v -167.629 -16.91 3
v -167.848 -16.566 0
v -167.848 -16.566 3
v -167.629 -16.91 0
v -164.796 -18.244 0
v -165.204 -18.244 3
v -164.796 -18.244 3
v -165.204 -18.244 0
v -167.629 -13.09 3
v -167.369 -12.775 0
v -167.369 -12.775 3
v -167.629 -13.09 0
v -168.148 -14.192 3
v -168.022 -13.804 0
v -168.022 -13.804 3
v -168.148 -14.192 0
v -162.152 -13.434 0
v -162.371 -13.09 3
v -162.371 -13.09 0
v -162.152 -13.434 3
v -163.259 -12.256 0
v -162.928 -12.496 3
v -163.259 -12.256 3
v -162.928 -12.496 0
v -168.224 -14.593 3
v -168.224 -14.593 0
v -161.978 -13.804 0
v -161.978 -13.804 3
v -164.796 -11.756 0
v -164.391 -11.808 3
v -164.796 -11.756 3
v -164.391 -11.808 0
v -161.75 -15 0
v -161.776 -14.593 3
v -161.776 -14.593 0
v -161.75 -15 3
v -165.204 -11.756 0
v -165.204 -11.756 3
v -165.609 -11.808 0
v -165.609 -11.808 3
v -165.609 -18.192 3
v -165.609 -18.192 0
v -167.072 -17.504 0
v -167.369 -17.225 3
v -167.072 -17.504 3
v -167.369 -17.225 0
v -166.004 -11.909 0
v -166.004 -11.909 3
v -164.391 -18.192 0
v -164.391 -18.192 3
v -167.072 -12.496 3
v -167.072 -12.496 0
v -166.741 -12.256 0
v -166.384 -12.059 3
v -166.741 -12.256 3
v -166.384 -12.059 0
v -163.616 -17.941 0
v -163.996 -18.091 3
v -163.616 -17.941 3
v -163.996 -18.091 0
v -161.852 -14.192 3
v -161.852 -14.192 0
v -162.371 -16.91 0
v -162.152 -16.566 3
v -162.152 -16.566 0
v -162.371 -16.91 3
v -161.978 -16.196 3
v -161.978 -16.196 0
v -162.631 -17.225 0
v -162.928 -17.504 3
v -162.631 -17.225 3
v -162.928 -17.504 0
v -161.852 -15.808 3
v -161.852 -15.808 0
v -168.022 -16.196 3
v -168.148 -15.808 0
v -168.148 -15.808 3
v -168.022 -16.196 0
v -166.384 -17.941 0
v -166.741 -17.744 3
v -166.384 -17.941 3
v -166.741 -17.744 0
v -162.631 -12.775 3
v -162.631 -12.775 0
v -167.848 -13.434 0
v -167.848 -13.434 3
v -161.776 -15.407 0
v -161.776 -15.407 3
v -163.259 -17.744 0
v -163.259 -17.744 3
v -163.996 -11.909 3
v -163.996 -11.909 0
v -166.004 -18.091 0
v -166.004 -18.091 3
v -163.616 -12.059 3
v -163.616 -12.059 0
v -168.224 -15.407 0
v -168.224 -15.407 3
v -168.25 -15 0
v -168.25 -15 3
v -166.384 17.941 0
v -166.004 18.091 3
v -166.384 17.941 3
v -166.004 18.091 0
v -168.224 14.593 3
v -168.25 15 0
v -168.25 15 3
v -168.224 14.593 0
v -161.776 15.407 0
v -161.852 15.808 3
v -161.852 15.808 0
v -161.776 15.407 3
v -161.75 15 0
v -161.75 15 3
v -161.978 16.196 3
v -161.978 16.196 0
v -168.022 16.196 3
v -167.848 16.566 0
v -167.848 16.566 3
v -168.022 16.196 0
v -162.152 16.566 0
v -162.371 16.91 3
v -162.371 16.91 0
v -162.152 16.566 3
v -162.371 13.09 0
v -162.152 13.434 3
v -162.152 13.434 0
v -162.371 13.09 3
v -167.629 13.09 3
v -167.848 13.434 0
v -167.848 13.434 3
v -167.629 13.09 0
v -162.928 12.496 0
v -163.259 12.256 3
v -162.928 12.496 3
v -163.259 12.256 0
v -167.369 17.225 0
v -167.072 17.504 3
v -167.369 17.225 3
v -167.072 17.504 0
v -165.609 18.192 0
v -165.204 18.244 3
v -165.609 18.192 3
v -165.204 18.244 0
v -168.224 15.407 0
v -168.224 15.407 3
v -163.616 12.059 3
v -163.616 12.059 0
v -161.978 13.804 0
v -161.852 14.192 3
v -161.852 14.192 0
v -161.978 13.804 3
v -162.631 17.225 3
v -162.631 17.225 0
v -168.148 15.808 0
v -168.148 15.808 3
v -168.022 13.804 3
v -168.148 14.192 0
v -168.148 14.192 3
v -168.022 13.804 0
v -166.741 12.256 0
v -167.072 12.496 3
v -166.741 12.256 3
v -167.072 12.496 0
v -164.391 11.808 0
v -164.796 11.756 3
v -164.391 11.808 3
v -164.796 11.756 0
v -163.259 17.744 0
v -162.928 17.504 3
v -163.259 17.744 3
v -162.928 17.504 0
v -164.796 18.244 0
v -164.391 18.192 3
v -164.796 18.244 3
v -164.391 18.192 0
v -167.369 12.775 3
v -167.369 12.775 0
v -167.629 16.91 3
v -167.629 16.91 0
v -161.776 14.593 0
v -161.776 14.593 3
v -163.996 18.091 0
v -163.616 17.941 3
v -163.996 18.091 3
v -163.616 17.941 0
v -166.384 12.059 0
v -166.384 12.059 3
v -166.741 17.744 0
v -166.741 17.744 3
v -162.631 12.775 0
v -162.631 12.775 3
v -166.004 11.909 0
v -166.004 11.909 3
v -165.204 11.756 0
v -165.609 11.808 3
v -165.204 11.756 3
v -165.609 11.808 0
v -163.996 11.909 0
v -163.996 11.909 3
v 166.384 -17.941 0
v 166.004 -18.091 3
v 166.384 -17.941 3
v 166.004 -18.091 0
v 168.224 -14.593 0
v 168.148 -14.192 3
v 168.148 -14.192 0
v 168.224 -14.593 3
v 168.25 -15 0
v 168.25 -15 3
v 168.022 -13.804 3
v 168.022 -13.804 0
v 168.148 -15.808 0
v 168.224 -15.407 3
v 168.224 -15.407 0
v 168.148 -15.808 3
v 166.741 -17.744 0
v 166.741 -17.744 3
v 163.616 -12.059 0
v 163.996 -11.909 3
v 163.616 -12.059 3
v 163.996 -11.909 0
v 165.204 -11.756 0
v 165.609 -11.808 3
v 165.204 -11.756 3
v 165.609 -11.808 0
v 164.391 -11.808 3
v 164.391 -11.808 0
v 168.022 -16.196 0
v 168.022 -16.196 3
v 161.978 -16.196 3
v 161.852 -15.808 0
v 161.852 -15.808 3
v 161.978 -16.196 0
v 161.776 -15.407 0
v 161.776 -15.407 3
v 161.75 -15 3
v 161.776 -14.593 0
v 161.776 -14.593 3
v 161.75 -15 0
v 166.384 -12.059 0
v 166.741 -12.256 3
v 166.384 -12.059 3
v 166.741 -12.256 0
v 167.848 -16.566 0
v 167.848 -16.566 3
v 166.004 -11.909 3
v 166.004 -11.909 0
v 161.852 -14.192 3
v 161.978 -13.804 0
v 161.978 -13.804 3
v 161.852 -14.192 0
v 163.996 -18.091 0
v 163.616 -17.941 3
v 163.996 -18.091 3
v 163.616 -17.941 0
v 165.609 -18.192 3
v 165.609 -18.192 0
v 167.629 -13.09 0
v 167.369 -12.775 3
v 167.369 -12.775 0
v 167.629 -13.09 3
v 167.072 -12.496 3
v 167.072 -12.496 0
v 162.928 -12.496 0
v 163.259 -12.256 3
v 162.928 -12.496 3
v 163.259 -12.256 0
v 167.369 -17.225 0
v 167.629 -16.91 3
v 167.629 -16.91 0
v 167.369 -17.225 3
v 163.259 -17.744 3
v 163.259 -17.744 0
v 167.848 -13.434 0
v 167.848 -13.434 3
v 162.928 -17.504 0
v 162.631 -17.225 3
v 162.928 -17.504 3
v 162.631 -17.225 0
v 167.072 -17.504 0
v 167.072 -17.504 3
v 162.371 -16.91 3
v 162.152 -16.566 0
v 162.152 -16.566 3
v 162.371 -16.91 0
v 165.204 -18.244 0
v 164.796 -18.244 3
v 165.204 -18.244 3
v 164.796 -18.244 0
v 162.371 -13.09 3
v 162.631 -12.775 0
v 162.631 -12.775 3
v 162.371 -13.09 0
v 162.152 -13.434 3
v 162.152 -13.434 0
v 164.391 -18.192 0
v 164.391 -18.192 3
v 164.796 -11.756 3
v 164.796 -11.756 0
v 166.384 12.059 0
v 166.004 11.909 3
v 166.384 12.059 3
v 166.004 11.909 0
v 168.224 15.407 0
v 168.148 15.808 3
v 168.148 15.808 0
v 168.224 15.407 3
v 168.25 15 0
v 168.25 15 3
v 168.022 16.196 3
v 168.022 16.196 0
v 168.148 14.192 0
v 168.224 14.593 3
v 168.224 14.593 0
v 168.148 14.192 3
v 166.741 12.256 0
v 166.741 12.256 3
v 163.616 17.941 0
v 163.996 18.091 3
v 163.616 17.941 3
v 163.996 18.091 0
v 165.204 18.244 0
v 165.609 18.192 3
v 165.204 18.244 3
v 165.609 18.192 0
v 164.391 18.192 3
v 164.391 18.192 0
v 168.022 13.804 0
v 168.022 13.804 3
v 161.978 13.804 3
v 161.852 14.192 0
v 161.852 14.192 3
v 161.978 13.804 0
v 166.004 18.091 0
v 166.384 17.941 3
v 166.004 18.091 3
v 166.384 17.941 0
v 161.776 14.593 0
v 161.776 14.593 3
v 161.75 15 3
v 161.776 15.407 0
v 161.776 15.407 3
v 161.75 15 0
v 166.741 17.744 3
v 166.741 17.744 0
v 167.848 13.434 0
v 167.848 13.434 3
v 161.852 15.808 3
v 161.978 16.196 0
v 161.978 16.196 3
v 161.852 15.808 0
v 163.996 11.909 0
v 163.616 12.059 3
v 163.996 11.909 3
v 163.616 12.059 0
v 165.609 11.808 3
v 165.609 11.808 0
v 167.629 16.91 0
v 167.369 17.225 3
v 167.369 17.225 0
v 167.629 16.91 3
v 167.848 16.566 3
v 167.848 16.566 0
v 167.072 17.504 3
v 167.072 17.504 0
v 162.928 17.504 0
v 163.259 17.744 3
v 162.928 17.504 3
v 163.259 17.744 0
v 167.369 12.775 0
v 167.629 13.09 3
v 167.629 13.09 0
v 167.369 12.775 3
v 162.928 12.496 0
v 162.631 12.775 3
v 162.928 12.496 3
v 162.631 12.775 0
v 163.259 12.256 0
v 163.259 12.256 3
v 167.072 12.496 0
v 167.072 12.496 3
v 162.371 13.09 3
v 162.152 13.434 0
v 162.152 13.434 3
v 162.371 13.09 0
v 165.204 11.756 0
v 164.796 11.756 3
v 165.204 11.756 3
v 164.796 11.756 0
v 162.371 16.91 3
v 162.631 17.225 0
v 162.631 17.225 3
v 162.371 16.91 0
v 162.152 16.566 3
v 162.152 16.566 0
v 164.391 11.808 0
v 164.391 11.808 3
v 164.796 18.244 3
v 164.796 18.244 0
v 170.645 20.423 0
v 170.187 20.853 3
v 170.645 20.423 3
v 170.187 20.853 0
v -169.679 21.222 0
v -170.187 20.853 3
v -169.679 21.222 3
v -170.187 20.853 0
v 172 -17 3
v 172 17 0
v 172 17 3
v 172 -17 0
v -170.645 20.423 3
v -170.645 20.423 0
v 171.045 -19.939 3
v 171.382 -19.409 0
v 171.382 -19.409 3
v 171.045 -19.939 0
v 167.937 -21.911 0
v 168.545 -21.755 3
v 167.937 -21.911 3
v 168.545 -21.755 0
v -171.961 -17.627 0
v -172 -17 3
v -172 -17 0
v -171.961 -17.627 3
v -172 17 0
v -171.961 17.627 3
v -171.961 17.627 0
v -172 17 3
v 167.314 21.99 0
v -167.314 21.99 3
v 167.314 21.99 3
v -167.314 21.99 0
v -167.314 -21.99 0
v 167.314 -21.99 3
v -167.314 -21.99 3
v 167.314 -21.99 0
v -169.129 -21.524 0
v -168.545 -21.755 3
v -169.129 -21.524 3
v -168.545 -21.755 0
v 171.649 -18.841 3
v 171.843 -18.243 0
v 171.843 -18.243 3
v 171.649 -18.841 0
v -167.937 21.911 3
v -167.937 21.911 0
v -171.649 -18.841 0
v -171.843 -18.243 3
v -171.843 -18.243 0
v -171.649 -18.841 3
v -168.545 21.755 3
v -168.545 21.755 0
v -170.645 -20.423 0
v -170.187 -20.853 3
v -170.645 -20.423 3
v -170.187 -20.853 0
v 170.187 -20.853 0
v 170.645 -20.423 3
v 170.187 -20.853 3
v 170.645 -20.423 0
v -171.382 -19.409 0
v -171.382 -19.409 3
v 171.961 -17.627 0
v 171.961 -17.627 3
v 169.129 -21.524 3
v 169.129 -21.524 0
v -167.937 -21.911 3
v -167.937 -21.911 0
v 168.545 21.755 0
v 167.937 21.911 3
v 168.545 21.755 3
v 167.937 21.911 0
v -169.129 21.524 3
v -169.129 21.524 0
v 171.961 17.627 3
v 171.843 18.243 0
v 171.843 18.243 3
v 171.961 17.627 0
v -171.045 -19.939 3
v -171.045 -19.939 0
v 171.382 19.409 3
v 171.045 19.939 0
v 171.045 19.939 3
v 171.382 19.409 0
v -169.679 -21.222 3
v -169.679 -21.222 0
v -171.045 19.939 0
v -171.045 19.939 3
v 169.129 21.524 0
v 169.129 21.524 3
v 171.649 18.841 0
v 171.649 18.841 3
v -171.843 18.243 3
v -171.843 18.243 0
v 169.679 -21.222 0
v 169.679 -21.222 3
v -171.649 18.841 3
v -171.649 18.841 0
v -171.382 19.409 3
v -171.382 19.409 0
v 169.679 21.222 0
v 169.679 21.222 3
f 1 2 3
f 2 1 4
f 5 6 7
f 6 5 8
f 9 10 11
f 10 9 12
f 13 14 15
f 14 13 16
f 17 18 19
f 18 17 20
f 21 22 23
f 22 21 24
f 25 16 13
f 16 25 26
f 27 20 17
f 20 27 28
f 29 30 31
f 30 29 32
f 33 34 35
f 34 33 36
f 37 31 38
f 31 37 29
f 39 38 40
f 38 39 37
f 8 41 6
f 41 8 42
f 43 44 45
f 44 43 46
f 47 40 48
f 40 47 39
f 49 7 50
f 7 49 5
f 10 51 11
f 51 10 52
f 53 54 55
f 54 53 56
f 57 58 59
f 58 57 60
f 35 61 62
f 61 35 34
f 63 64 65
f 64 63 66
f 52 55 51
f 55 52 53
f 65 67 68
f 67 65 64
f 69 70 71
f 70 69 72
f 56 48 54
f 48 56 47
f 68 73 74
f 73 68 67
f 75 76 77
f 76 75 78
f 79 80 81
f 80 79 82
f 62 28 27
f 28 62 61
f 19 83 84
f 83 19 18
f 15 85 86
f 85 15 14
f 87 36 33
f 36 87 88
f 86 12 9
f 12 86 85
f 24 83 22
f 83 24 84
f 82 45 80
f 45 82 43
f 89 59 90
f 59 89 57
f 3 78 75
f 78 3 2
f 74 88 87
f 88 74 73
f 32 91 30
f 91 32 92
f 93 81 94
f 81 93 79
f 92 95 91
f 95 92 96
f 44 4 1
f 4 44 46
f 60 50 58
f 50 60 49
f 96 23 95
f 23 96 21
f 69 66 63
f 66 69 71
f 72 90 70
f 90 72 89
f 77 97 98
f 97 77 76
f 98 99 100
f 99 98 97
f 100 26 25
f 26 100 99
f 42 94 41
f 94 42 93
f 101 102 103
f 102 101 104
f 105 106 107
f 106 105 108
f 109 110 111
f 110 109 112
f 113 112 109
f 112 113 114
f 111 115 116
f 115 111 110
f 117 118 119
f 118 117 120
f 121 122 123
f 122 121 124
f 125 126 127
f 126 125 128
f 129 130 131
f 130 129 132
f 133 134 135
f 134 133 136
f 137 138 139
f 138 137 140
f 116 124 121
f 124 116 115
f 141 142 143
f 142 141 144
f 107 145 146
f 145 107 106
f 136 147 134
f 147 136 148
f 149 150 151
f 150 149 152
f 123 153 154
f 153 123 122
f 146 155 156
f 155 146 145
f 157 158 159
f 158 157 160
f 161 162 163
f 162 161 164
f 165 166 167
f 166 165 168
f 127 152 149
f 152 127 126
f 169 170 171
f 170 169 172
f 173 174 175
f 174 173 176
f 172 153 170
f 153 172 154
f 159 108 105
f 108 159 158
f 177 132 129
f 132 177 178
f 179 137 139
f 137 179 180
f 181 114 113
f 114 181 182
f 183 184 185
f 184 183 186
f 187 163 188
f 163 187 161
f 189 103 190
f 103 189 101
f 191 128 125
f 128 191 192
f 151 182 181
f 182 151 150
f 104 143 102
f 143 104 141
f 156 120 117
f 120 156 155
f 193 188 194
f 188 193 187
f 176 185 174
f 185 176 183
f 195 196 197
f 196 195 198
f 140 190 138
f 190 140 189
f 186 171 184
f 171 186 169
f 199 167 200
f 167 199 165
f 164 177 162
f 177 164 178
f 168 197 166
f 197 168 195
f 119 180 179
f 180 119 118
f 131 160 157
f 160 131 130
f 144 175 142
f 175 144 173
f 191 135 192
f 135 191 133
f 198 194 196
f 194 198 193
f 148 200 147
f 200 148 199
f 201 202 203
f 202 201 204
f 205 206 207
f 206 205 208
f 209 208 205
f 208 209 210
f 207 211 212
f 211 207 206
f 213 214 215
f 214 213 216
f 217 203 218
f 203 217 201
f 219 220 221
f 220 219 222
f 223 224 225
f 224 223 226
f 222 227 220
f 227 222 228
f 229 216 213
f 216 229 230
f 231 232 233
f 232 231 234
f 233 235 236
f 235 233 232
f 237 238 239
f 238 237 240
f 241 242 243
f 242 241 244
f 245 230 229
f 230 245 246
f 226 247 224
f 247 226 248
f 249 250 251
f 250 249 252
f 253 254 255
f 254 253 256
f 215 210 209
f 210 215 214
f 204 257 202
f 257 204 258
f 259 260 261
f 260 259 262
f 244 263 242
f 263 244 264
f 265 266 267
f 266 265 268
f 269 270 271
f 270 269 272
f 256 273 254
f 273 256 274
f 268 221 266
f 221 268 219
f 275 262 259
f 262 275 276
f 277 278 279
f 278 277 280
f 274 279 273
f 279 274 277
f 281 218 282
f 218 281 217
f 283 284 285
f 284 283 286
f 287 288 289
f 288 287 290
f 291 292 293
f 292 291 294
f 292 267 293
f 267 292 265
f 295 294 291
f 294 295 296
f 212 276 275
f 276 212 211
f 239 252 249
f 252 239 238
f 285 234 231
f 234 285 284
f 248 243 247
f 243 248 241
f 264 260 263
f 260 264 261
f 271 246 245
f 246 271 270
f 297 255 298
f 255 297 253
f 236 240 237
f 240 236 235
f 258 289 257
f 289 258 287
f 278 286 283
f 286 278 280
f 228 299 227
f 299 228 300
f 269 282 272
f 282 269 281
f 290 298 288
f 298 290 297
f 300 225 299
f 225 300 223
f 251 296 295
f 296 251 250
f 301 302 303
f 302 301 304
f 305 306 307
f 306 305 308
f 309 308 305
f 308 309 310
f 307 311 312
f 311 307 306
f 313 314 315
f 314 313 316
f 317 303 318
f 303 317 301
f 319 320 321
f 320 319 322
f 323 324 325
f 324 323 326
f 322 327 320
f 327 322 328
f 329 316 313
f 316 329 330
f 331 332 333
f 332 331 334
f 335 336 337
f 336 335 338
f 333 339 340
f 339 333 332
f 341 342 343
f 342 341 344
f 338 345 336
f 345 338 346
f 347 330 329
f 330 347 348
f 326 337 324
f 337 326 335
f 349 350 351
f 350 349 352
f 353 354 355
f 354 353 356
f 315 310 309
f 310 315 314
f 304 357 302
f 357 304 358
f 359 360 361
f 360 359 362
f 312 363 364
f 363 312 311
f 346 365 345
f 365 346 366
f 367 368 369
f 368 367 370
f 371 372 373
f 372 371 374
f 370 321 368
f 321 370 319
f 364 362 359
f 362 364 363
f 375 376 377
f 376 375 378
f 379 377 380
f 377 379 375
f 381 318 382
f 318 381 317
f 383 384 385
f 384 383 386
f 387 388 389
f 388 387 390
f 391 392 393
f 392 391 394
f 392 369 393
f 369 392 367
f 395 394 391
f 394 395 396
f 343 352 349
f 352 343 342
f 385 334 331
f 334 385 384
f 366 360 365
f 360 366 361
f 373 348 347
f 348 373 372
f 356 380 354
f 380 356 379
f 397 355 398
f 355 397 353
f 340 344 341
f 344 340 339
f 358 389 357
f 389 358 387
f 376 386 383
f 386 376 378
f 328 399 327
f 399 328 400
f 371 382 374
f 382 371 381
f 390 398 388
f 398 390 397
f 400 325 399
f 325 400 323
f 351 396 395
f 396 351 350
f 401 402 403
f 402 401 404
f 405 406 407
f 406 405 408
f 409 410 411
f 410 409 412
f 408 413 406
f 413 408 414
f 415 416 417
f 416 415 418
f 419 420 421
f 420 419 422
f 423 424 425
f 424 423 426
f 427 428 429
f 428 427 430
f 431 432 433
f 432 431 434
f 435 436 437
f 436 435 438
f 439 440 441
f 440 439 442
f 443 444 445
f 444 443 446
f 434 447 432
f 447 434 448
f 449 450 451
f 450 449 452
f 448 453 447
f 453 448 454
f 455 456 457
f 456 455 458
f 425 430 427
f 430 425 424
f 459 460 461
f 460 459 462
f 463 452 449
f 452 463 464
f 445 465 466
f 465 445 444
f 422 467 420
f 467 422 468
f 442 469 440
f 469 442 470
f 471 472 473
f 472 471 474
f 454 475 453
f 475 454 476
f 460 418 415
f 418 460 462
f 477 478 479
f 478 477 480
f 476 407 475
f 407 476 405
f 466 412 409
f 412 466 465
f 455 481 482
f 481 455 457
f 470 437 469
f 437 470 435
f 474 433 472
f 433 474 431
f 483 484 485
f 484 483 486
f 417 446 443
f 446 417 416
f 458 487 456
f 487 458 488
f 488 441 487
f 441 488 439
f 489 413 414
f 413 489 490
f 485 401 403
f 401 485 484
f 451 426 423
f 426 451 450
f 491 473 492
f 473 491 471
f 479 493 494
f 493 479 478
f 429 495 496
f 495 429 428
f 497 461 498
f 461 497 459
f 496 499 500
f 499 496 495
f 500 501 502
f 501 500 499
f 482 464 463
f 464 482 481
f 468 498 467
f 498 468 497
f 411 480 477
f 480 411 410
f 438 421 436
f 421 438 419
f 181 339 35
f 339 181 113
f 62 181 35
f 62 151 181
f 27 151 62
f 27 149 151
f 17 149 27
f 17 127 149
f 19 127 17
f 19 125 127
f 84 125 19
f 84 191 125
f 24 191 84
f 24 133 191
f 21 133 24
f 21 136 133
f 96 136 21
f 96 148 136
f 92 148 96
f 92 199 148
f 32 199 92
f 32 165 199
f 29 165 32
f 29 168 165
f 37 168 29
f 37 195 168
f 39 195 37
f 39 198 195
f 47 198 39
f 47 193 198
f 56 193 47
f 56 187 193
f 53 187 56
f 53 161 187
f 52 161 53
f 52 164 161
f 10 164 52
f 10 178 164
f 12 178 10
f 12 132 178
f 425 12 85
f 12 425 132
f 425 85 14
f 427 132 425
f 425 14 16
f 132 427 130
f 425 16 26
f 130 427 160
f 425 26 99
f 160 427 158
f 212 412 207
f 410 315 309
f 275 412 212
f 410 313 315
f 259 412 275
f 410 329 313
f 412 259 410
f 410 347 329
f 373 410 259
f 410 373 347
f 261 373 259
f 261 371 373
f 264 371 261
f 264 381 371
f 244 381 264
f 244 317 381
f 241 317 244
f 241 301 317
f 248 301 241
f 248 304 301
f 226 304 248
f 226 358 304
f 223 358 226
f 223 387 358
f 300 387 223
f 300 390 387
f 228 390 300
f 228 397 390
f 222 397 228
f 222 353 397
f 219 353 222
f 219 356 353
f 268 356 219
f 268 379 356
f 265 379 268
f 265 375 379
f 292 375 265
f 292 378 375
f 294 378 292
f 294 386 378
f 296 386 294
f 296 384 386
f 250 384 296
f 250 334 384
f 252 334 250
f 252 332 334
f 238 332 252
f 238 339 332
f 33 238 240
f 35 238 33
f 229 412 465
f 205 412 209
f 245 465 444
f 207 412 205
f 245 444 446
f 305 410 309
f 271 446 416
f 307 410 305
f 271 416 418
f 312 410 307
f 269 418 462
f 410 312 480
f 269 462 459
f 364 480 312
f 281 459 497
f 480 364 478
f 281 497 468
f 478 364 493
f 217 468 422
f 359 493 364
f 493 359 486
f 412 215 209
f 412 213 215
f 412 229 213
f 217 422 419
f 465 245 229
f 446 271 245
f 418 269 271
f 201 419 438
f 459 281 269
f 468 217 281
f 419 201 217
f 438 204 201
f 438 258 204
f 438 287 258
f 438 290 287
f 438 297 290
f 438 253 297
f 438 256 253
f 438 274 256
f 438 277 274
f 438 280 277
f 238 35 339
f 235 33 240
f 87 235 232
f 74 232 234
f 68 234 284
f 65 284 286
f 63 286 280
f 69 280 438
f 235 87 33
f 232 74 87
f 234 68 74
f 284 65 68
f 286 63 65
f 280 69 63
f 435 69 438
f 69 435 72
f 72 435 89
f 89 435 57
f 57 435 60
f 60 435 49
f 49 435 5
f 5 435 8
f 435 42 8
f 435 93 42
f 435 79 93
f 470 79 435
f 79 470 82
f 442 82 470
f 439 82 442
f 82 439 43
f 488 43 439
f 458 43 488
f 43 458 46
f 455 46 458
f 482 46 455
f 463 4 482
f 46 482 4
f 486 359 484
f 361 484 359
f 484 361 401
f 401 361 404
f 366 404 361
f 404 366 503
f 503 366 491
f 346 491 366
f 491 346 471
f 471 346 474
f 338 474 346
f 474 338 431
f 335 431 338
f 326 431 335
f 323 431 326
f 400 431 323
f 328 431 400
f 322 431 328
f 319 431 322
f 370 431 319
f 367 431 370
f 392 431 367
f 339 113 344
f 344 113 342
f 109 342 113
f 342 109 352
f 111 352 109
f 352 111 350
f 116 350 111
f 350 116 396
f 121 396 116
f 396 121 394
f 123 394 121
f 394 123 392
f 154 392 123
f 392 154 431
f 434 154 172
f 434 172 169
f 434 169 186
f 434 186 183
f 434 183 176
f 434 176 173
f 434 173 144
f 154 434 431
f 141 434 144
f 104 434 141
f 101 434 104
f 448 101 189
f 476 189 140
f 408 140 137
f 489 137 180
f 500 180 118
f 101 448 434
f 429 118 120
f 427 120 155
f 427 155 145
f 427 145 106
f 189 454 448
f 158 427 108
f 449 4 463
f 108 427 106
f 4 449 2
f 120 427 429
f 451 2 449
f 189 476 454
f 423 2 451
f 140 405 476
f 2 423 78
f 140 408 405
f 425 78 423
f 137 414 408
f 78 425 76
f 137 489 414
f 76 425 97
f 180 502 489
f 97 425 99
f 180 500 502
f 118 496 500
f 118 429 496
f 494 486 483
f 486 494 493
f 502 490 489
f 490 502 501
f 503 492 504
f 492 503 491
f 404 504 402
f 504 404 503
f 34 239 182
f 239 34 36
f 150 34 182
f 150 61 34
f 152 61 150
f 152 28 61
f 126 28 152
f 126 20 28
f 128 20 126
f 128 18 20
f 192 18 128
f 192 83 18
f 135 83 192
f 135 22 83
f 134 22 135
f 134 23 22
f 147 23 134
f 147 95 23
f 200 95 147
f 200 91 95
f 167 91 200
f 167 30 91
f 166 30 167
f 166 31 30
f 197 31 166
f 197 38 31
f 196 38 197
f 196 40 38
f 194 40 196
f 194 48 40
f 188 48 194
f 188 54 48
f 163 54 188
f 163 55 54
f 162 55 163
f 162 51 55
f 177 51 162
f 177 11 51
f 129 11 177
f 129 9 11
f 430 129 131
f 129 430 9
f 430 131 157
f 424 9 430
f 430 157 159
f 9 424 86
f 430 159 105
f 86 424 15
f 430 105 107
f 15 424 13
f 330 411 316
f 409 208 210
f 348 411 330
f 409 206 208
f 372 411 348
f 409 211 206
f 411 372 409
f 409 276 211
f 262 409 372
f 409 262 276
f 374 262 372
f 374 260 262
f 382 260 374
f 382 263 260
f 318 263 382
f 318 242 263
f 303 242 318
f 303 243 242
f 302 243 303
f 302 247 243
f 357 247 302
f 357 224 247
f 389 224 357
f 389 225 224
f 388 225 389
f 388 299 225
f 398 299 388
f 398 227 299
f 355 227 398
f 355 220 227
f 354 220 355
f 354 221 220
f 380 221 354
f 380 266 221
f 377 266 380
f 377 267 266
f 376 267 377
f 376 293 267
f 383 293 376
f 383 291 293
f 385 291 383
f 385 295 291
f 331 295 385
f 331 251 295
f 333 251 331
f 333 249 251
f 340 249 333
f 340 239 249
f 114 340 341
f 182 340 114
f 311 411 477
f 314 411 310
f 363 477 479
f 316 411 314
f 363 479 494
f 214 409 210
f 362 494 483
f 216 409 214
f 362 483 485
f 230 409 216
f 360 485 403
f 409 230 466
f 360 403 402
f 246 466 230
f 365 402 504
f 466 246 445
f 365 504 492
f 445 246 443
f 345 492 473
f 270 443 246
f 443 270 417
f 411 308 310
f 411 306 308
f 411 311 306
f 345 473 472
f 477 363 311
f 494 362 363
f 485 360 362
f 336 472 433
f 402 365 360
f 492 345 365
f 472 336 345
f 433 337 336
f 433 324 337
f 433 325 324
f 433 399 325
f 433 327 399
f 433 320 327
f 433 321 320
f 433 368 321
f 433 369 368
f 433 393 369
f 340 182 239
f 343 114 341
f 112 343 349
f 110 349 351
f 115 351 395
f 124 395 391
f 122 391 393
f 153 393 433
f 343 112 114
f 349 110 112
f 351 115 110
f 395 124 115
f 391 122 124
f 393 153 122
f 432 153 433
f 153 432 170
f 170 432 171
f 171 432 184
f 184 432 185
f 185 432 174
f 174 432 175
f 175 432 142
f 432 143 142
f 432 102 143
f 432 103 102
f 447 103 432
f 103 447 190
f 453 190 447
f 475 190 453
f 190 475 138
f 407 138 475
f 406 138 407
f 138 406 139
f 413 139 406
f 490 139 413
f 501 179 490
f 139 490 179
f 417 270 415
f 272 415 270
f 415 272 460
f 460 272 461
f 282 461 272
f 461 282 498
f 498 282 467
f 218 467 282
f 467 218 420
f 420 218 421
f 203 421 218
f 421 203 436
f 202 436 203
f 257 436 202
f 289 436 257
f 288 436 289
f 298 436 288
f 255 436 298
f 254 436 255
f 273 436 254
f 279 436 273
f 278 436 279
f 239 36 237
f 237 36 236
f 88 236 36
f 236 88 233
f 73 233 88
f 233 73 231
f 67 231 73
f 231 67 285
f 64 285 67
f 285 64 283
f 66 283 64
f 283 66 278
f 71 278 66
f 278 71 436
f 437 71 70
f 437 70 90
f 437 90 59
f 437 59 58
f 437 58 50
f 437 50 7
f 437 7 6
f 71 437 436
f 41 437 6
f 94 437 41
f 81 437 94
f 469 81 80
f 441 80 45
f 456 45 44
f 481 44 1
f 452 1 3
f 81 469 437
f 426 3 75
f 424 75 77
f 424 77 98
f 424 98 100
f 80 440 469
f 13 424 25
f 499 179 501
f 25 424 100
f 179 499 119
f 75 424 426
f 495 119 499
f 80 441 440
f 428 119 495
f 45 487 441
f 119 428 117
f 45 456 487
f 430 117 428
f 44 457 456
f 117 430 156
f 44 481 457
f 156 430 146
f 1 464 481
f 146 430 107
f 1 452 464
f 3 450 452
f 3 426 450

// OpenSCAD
$fn = 50;


difference() {
	union() {
		hull() {
			translate(v = [-167.0000000000, 17.0000000000, 0]) {
				cylinder(h = 3, r = 5);
			}
			translate(v = [167.0000000000, 17.0000000000, 0]) {
				cylinder(h = 3, r = 5);
			}
			translate(v = [-167.0000000000, -17.0000000000, 0]) {
				cylinder(h = 3, r = 5);
			}
			translate(v = [167.0000000000, -17.0000000000, 0]) {
				cylinder(h = 3, r = 5);
			}
		}
	}
	union() {
		translate(v = [-165.0000000000, -15.0000000000, -100.0000000000]) {
			cylinder(h = 200, r = 3.2500000000);
		}
		translate(v = [-165.0000000000, 15.0000000000, -100.0000000000]) {
			cylinder(h = 200, r = 3.2500000000);
		}
		translate(v = [165.0000000000, -15.0000000000, -100.0000000000]) {
			cylinder(h = 200, r = 3.2500000000);
		}
		translate(v = [165.0000000000, 15.0000000000, -100.0000000000]) {
			cylinder(h = 200, r = 3.2500000000);
		}
	}
}
